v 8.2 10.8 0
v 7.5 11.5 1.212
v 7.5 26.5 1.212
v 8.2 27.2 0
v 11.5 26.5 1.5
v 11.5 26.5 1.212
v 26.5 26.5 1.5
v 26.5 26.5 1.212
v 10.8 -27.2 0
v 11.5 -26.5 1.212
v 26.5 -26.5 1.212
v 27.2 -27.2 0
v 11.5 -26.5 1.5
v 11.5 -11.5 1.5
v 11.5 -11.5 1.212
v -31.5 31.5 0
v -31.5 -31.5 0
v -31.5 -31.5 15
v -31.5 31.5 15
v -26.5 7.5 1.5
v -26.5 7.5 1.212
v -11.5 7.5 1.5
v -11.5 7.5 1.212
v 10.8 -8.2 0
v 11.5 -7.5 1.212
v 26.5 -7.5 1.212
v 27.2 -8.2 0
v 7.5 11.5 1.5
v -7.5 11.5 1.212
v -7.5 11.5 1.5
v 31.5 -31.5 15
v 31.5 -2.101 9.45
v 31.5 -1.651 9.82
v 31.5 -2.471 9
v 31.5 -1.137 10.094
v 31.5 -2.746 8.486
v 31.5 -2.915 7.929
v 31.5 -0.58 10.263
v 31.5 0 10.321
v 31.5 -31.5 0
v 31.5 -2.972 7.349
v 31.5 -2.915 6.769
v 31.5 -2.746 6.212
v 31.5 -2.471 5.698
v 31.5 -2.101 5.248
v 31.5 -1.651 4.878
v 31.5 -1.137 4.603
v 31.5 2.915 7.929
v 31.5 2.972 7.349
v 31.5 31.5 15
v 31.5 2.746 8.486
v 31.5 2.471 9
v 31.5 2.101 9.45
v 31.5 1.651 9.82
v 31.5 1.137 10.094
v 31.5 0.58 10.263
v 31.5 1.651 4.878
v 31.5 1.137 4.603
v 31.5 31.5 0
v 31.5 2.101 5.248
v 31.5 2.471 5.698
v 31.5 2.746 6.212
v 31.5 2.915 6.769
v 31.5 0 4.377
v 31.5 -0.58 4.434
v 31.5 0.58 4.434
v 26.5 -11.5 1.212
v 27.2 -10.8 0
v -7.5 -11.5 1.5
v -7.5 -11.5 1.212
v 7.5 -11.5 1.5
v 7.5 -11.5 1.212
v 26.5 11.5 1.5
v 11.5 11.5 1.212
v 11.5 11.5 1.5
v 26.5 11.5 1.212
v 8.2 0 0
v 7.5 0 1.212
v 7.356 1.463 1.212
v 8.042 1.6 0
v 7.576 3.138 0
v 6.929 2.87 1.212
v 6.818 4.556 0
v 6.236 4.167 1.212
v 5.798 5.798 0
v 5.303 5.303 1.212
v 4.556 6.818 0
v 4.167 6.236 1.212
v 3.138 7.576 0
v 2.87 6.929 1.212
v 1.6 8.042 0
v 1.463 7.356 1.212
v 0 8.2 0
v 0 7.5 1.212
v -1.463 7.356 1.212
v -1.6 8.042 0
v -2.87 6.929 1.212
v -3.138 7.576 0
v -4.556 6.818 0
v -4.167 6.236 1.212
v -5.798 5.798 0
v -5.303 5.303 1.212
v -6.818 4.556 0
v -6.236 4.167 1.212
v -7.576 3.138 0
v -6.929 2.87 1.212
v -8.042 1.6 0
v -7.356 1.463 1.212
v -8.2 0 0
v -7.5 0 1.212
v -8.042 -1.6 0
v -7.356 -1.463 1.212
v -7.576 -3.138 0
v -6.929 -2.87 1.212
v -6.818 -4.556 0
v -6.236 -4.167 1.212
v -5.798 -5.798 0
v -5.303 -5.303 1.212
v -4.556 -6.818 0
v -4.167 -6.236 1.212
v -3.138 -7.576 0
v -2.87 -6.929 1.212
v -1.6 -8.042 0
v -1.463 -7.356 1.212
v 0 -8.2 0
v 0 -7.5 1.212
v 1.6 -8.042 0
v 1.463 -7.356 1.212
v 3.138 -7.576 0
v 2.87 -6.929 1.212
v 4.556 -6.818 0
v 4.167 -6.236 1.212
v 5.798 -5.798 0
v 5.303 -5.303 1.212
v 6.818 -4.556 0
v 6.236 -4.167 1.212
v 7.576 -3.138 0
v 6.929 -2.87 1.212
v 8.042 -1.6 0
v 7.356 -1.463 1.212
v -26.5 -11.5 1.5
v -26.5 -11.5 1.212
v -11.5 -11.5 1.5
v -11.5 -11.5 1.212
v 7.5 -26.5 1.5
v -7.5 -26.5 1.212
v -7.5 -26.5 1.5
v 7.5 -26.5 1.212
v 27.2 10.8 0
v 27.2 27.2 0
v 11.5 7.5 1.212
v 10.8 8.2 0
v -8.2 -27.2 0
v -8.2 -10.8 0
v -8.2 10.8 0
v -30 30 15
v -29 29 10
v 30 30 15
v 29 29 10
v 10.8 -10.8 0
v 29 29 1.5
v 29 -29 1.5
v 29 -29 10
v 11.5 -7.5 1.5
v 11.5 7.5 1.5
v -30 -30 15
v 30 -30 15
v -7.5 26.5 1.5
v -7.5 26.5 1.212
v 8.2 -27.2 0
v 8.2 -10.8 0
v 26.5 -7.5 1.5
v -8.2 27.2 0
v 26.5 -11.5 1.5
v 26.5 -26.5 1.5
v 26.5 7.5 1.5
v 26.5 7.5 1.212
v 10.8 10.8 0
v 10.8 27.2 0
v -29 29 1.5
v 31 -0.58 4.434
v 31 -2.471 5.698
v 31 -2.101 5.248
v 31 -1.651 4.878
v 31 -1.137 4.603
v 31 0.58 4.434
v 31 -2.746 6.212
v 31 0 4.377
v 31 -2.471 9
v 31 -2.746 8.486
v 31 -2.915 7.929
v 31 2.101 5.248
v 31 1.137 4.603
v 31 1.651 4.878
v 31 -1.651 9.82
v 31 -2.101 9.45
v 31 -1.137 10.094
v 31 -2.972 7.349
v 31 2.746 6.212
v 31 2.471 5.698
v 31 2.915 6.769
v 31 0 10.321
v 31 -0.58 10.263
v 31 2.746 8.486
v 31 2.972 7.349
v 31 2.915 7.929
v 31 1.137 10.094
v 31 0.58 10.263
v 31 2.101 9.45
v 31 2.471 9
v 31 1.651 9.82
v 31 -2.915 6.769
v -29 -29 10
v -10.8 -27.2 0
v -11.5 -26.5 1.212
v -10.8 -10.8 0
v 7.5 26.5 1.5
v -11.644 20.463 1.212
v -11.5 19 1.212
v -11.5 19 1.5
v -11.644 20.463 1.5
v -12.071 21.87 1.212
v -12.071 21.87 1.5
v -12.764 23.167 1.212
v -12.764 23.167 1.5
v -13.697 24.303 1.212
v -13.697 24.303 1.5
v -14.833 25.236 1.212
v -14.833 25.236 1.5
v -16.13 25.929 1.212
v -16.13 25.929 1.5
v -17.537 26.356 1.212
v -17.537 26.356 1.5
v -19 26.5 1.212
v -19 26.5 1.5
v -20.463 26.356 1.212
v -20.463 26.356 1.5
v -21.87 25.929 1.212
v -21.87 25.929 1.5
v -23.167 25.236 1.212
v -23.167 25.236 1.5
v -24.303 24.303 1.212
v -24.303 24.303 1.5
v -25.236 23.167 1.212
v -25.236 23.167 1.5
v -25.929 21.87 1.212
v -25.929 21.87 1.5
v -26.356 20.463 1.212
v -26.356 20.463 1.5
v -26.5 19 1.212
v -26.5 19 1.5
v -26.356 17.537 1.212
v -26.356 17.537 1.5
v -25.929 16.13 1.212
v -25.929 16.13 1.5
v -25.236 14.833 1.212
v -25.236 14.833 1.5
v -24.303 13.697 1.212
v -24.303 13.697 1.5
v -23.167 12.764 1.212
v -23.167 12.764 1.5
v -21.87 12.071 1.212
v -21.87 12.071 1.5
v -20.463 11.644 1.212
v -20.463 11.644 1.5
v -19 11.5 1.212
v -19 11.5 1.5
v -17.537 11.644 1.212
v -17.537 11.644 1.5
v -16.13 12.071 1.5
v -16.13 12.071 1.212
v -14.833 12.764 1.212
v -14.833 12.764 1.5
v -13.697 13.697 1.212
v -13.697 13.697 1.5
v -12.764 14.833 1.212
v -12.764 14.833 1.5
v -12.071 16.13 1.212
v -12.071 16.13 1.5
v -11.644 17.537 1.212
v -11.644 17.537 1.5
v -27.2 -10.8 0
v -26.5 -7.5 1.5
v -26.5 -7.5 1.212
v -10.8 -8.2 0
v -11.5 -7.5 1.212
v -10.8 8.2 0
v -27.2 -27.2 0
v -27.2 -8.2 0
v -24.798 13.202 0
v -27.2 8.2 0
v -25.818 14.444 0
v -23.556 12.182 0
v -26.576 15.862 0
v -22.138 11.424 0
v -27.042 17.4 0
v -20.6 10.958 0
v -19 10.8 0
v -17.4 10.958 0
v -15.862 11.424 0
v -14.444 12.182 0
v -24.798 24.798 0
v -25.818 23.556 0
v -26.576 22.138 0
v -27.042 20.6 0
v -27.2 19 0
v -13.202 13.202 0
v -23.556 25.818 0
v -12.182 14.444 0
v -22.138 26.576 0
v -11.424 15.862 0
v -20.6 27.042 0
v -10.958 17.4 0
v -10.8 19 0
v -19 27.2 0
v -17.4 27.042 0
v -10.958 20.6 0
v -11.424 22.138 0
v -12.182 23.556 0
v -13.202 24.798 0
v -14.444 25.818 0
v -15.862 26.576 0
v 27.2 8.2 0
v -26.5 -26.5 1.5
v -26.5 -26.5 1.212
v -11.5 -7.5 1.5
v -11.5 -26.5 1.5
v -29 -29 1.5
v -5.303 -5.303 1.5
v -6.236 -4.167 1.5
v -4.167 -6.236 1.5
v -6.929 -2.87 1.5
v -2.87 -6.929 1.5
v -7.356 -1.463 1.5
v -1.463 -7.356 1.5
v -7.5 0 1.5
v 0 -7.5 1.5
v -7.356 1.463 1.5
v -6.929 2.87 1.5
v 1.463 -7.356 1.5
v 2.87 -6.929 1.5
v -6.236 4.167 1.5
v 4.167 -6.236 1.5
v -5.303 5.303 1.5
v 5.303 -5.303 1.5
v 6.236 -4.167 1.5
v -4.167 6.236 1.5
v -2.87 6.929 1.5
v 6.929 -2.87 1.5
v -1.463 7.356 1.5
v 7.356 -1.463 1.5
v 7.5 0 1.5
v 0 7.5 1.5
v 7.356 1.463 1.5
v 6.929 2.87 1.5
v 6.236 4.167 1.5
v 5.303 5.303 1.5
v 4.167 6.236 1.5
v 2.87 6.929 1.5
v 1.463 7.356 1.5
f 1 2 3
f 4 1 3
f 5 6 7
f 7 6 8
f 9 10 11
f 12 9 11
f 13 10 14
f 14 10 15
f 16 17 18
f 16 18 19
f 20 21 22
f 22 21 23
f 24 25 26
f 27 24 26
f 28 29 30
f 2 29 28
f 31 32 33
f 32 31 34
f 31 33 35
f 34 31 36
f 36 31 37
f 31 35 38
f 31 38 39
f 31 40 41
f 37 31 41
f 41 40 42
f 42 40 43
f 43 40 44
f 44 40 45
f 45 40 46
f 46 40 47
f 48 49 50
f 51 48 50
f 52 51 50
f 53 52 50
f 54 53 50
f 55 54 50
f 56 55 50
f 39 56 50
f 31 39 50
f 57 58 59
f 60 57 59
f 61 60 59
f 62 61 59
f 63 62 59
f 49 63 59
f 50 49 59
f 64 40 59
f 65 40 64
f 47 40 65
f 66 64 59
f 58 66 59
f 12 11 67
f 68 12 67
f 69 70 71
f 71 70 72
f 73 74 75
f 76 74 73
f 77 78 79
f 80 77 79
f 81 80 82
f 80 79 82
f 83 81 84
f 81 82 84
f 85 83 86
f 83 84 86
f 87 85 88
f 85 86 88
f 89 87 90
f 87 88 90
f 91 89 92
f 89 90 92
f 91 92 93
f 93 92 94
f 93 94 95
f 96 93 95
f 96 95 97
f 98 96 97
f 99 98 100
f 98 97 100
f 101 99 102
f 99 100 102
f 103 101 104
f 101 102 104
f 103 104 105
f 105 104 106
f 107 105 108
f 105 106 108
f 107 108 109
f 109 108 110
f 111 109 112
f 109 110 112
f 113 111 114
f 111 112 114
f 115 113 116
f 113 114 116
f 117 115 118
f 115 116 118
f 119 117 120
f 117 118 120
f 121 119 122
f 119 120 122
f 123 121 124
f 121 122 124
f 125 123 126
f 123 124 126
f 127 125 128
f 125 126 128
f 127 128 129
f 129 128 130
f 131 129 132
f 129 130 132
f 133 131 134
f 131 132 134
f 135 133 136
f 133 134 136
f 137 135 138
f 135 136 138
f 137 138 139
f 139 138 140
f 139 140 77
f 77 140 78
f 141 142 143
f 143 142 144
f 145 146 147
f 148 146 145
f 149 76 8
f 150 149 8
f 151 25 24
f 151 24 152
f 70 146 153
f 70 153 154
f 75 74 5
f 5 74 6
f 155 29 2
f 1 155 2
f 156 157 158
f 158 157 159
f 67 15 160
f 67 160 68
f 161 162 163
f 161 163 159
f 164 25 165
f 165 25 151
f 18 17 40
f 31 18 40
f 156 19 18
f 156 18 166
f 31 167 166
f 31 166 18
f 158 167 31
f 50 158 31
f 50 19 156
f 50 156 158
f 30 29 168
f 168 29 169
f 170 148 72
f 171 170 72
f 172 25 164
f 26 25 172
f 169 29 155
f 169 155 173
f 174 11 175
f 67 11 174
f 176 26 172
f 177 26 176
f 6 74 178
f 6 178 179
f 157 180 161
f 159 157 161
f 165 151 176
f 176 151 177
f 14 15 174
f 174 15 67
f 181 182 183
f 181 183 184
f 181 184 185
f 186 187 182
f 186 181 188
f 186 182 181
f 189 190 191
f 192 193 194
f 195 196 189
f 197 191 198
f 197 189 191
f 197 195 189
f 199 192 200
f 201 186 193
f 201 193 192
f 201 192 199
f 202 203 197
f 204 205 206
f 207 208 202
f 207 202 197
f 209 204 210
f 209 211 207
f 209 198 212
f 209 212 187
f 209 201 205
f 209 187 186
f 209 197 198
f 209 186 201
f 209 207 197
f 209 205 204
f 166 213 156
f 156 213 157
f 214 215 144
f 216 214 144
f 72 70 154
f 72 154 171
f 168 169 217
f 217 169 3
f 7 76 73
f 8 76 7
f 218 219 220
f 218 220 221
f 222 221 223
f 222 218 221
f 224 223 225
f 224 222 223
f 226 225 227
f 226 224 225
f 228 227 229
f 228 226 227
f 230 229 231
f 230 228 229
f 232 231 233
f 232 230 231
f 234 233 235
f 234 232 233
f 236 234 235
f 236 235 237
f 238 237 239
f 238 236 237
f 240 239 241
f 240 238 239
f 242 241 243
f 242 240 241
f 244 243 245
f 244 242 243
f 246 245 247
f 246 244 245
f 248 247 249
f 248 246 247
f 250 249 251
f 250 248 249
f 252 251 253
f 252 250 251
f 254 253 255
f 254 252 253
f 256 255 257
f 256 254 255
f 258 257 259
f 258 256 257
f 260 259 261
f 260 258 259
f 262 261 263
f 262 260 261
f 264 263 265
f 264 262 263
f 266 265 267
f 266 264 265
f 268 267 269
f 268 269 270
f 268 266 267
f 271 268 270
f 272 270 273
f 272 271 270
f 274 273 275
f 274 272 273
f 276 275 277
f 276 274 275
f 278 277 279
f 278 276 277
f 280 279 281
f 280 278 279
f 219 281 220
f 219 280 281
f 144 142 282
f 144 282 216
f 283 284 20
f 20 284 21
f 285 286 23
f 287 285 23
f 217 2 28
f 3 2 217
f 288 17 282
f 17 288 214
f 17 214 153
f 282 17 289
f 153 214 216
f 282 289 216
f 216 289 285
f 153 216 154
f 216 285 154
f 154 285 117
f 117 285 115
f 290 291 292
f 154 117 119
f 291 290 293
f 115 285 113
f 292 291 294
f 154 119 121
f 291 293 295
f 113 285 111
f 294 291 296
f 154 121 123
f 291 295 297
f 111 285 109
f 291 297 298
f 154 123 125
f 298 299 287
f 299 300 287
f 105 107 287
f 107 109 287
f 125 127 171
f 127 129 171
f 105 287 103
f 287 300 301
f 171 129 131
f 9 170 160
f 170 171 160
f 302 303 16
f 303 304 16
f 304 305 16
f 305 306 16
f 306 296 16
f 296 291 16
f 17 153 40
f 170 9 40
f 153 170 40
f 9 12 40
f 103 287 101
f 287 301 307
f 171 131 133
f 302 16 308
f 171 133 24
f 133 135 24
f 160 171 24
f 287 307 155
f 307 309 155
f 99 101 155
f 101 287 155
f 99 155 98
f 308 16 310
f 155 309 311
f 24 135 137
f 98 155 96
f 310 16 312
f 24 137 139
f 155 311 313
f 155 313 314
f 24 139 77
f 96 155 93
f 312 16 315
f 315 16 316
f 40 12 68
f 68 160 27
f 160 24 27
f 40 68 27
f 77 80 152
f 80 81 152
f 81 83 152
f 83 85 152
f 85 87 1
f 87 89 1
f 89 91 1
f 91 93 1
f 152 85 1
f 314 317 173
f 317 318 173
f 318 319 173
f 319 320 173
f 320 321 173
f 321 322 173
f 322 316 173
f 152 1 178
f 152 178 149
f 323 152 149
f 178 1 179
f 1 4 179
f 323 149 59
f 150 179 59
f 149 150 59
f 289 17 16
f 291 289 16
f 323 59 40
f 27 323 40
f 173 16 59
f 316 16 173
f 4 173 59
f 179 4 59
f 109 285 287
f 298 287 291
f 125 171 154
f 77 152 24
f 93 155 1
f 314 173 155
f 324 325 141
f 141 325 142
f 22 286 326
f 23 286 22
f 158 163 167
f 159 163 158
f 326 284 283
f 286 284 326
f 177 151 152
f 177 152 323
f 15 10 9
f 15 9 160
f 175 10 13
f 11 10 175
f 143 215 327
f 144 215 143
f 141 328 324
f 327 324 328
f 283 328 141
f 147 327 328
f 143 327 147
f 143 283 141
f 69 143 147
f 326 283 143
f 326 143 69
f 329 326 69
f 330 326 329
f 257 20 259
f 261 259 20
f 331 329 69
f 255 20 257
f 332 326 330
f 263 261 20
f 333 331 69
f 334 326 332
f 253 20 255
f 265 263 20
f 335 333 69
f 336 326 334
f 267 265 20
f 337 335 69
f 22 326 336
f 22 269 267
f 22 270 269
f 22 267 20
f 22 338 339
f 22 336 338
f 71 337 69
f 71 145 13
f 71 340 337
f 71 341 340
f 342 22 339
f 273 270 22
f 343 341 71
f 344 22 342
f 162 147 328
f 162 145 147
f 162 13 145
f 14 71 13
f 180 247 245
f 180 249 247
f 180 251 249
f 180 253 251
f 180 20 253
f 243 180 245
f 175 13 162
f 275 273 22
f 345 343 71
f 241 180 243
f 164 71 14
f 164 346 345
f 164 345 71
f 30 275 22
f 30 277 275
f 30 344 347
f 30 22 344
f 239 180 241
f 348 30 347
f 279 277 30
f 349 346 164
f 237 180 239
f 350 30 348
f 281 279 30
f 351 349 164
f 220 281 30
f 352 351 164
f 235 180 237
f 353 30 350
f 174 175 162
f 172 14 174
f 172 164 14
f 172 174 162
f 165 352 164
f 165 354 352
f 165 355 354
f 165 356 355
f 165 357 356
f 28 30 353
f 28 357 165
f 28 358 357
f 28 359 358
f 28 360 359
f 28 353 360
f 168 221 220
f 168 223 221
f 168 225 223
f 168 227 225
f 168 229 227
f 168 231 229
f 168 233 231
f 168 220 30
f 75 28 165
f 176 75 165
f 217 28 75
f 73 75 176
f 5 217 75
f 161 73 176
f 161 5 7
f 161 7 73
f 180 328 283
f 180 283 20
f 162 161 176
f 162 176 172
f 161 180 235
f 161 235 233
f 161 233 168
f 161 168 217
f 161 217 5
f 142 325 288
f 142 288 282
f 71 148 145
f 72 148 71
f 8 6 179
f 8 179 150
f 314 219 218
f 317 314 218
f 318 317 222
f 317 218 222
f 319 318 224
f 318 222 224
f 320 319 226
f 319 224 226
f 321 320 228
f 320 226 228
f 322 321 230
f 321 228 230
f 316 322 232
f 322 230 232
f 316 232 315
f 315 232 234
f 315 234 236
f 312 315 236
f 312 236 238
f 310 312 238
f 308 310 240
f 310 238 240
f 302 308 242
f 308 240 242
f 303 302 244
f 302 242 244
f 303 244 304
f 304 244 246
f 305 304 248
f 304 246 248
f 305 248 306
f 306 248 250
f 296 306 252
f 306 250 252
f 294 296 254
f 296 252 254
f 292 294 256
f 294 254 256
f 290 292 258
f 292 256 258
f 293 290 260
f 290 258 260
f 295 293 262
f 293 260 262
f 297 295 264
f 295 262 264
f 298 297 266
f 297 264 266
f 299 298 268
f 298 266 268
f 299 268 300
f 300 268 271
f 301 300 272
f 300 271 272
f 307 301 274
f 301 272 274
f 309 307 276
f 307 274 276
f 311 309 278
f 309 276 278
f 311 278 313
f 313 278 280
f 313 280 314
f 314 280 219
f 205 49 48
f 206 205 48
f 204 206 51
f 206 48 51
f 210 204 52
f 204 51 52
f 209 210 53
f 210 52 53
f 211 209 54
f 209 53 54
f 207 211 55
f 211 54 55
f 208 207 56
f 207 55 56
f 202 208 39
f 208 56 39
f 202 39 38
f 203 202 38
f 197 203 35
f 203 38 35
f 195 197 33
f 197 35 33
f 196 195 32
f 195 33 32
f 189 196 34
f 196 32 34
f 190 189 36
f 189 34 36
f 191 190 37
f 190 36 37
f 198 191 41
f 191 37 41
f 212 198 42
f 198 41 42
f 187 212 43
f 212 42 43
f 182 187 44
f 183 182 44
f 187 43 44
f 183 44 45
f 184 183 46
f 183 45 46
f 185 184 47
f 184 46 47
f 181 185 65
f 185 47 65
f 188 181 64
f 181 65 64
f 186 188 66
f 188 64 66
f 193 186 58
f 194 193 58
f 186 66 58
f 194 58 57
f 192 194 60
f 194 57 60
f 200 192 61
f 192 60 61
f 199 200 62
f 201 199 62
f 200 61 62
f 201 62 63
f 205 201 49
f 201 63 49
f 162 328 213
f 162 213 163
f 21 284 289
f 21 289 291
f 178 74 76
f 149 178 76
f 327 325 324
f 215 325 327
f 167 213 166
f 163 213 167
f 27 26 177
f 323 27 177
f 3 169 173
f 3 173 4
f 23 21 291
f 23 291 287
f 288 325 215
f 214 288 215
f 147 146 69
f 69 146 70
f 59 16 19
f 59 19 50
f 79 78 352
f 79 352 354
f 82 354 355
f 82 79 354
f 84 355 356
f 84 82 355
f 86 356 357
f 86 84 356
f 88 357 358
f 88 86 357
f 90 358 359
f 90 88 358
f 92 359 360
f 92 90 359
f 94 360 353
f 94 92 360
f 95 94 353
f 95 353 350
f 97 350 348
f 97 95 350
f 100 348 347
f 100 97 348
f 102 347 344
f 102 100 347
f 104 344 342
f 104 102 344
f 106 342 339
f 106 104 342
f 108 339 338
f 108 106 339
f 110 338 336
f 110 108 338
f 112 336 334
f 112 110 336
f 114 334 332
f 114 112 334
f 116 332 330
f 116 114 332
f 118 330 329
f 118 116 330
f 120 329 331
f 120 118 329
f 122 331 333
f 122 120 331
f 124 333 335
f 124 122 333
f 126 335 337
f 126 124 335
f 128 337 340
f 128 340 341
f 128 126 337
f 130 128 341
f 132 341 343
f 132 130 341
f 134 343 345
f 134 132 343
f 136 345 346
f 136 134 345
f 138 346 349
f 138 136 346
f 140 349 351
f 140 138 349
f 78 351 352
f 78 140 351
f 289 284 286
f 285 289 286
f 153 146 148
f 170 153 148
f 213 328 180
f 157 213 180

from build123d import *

# Parameters (mm, degrees)
F0_W     = 58
F0_H     = 58
F0_W_2   = 15
F0_H_2   = 15
F0_R     = 7.5
F1_DEPTH = 1.5
F2_W     = 63
F2_H     = 63
F2_W_2   = 58
F2_H_2   = 58
F3_DEPTH = 15
F4_SIZE2 = 1.2124355653
F4_SIZE  = 0.7
F5_SIZE2 = 5
F5_SIZE  = 1
F6_R     = 2.971748634
F7_DEPTH = 0.5


# Not quite as in the source:
# - a feature names something its author has since deleted; it is built from what else it names


with BuildPart() as f1:
    # F0 (on Top) → F1 (new body)
    with BuildSketch(Plane.XY):
        Rectangle(F0_W, F0_H)
        with Locations((-19, -19)):
            Rectangle(F0_W_2, F0_H_2, mode=Mode.SUBTRACT)
        with Locations((0, -19)):
            Rectangle(F0_W_2, F0_H_2, mode=Mode.SUBTRACT)
        with Locations((19, -19)):
            Rectangle(F0_W_2, F0_H_2, mode=Mode.SUBTRACT)
        with Locations((-19, 0)):
            Rectangle(F0_W_2, F0_H_2, mode=Mode.SUBTRACT)
        with Locations((-19, 19)):
            Circle(F0_R, mode=Mode.SUBTRACT)
        Circle(F0_R, mode=Mode.SUBTRACT)
        with Locations((19, 0)):
            Rectangle(F0_W_2, F0_H_2, mode=Mode.SUBTRACT)
        with Locations((0, 19)):
            Rectangle(F0_W_2, F0_H_2, mode=Mode.SUBTRACT)
        with Locations((19, 19)):
            Rectangle(F0_W_2, F0_H_2, mode=Mode.SUBTRACT)
    extrude(amount=F1_DEPTH)

    # F2 (on Top) → F3 (join)
    with BuildSketch(Plane.XY):
        Rectangle(F2_W, F2_H)
        Rectangle(F2_W_2, F2_H_2, mode=Mode.SUBTRACT)
    extrude(amount=F3_DEPTH)

    # F4
    f4_edges = [f1.edges().sort_by_distance(p)[0] for p in [
        (-26.5, 19, 0),
        (-7.5, 0, 0),
        (-11.5, 0, 0),
        (-19, 7.5, 0),
        (-26.5, 0, 0),
        (-19, -7.5, 0),
        (-19, -11.5, 0),
        (-11.5, -19, 0),
        (-26.5, -19, 0),
        (-19, -26.5, 0),
        (0, -26.5, 0),
        (-7.5, -19, 0),
        (0, -11.5, 0),
        (7.5, -19, 0),
        (11.5, -19, 0),
        (19, -11.5, 0),
        (26.5, -19, 0),
        (19, -26.5, 0),
        (19, -7.5, 0),
        (11.5, 0, 0),
        (19, 7.5, 0),
        (26.5, 0, 0),
        (19, 11.5, 0),
        (11.5, 19, 0),
        (19, 26.5, 0),
        (26.5, 19, 0),
        (7.5, 19, 0),
        (0, 11.5, 0),
        (-7.5, 19, 0),
        (0, 26.5, 0),
    ]]
    chamfer(f4_edges, length=F4_SIZE, length2=F4_SIZE2)

    # F5
    f5_edges = [f1.edges().sort_by_distance(p)[0] for p in [
        (-29, 0, 15),
        (0, 29, 15),
        (29, 0, 15),
        (0, -29, 15),
    ]]
    f5_side = f1.faces().sort_by_distance((0, -30.609045, 15))[0]
    chamfer(f5_edges, length=F5_SIZE, length2=F5_SIZE2, reference=f5_side)

    # F6 (on face) → F7 (cut)
    with BuildSketch(Plane.YZ.offset(31.5)):
        with Locations((0, 7.3488471098)):
            Circle(F6_R)
    extrude(amount=-F7_DEPTH, mode=Mode.SUBTRACT)


solid = f1.part
